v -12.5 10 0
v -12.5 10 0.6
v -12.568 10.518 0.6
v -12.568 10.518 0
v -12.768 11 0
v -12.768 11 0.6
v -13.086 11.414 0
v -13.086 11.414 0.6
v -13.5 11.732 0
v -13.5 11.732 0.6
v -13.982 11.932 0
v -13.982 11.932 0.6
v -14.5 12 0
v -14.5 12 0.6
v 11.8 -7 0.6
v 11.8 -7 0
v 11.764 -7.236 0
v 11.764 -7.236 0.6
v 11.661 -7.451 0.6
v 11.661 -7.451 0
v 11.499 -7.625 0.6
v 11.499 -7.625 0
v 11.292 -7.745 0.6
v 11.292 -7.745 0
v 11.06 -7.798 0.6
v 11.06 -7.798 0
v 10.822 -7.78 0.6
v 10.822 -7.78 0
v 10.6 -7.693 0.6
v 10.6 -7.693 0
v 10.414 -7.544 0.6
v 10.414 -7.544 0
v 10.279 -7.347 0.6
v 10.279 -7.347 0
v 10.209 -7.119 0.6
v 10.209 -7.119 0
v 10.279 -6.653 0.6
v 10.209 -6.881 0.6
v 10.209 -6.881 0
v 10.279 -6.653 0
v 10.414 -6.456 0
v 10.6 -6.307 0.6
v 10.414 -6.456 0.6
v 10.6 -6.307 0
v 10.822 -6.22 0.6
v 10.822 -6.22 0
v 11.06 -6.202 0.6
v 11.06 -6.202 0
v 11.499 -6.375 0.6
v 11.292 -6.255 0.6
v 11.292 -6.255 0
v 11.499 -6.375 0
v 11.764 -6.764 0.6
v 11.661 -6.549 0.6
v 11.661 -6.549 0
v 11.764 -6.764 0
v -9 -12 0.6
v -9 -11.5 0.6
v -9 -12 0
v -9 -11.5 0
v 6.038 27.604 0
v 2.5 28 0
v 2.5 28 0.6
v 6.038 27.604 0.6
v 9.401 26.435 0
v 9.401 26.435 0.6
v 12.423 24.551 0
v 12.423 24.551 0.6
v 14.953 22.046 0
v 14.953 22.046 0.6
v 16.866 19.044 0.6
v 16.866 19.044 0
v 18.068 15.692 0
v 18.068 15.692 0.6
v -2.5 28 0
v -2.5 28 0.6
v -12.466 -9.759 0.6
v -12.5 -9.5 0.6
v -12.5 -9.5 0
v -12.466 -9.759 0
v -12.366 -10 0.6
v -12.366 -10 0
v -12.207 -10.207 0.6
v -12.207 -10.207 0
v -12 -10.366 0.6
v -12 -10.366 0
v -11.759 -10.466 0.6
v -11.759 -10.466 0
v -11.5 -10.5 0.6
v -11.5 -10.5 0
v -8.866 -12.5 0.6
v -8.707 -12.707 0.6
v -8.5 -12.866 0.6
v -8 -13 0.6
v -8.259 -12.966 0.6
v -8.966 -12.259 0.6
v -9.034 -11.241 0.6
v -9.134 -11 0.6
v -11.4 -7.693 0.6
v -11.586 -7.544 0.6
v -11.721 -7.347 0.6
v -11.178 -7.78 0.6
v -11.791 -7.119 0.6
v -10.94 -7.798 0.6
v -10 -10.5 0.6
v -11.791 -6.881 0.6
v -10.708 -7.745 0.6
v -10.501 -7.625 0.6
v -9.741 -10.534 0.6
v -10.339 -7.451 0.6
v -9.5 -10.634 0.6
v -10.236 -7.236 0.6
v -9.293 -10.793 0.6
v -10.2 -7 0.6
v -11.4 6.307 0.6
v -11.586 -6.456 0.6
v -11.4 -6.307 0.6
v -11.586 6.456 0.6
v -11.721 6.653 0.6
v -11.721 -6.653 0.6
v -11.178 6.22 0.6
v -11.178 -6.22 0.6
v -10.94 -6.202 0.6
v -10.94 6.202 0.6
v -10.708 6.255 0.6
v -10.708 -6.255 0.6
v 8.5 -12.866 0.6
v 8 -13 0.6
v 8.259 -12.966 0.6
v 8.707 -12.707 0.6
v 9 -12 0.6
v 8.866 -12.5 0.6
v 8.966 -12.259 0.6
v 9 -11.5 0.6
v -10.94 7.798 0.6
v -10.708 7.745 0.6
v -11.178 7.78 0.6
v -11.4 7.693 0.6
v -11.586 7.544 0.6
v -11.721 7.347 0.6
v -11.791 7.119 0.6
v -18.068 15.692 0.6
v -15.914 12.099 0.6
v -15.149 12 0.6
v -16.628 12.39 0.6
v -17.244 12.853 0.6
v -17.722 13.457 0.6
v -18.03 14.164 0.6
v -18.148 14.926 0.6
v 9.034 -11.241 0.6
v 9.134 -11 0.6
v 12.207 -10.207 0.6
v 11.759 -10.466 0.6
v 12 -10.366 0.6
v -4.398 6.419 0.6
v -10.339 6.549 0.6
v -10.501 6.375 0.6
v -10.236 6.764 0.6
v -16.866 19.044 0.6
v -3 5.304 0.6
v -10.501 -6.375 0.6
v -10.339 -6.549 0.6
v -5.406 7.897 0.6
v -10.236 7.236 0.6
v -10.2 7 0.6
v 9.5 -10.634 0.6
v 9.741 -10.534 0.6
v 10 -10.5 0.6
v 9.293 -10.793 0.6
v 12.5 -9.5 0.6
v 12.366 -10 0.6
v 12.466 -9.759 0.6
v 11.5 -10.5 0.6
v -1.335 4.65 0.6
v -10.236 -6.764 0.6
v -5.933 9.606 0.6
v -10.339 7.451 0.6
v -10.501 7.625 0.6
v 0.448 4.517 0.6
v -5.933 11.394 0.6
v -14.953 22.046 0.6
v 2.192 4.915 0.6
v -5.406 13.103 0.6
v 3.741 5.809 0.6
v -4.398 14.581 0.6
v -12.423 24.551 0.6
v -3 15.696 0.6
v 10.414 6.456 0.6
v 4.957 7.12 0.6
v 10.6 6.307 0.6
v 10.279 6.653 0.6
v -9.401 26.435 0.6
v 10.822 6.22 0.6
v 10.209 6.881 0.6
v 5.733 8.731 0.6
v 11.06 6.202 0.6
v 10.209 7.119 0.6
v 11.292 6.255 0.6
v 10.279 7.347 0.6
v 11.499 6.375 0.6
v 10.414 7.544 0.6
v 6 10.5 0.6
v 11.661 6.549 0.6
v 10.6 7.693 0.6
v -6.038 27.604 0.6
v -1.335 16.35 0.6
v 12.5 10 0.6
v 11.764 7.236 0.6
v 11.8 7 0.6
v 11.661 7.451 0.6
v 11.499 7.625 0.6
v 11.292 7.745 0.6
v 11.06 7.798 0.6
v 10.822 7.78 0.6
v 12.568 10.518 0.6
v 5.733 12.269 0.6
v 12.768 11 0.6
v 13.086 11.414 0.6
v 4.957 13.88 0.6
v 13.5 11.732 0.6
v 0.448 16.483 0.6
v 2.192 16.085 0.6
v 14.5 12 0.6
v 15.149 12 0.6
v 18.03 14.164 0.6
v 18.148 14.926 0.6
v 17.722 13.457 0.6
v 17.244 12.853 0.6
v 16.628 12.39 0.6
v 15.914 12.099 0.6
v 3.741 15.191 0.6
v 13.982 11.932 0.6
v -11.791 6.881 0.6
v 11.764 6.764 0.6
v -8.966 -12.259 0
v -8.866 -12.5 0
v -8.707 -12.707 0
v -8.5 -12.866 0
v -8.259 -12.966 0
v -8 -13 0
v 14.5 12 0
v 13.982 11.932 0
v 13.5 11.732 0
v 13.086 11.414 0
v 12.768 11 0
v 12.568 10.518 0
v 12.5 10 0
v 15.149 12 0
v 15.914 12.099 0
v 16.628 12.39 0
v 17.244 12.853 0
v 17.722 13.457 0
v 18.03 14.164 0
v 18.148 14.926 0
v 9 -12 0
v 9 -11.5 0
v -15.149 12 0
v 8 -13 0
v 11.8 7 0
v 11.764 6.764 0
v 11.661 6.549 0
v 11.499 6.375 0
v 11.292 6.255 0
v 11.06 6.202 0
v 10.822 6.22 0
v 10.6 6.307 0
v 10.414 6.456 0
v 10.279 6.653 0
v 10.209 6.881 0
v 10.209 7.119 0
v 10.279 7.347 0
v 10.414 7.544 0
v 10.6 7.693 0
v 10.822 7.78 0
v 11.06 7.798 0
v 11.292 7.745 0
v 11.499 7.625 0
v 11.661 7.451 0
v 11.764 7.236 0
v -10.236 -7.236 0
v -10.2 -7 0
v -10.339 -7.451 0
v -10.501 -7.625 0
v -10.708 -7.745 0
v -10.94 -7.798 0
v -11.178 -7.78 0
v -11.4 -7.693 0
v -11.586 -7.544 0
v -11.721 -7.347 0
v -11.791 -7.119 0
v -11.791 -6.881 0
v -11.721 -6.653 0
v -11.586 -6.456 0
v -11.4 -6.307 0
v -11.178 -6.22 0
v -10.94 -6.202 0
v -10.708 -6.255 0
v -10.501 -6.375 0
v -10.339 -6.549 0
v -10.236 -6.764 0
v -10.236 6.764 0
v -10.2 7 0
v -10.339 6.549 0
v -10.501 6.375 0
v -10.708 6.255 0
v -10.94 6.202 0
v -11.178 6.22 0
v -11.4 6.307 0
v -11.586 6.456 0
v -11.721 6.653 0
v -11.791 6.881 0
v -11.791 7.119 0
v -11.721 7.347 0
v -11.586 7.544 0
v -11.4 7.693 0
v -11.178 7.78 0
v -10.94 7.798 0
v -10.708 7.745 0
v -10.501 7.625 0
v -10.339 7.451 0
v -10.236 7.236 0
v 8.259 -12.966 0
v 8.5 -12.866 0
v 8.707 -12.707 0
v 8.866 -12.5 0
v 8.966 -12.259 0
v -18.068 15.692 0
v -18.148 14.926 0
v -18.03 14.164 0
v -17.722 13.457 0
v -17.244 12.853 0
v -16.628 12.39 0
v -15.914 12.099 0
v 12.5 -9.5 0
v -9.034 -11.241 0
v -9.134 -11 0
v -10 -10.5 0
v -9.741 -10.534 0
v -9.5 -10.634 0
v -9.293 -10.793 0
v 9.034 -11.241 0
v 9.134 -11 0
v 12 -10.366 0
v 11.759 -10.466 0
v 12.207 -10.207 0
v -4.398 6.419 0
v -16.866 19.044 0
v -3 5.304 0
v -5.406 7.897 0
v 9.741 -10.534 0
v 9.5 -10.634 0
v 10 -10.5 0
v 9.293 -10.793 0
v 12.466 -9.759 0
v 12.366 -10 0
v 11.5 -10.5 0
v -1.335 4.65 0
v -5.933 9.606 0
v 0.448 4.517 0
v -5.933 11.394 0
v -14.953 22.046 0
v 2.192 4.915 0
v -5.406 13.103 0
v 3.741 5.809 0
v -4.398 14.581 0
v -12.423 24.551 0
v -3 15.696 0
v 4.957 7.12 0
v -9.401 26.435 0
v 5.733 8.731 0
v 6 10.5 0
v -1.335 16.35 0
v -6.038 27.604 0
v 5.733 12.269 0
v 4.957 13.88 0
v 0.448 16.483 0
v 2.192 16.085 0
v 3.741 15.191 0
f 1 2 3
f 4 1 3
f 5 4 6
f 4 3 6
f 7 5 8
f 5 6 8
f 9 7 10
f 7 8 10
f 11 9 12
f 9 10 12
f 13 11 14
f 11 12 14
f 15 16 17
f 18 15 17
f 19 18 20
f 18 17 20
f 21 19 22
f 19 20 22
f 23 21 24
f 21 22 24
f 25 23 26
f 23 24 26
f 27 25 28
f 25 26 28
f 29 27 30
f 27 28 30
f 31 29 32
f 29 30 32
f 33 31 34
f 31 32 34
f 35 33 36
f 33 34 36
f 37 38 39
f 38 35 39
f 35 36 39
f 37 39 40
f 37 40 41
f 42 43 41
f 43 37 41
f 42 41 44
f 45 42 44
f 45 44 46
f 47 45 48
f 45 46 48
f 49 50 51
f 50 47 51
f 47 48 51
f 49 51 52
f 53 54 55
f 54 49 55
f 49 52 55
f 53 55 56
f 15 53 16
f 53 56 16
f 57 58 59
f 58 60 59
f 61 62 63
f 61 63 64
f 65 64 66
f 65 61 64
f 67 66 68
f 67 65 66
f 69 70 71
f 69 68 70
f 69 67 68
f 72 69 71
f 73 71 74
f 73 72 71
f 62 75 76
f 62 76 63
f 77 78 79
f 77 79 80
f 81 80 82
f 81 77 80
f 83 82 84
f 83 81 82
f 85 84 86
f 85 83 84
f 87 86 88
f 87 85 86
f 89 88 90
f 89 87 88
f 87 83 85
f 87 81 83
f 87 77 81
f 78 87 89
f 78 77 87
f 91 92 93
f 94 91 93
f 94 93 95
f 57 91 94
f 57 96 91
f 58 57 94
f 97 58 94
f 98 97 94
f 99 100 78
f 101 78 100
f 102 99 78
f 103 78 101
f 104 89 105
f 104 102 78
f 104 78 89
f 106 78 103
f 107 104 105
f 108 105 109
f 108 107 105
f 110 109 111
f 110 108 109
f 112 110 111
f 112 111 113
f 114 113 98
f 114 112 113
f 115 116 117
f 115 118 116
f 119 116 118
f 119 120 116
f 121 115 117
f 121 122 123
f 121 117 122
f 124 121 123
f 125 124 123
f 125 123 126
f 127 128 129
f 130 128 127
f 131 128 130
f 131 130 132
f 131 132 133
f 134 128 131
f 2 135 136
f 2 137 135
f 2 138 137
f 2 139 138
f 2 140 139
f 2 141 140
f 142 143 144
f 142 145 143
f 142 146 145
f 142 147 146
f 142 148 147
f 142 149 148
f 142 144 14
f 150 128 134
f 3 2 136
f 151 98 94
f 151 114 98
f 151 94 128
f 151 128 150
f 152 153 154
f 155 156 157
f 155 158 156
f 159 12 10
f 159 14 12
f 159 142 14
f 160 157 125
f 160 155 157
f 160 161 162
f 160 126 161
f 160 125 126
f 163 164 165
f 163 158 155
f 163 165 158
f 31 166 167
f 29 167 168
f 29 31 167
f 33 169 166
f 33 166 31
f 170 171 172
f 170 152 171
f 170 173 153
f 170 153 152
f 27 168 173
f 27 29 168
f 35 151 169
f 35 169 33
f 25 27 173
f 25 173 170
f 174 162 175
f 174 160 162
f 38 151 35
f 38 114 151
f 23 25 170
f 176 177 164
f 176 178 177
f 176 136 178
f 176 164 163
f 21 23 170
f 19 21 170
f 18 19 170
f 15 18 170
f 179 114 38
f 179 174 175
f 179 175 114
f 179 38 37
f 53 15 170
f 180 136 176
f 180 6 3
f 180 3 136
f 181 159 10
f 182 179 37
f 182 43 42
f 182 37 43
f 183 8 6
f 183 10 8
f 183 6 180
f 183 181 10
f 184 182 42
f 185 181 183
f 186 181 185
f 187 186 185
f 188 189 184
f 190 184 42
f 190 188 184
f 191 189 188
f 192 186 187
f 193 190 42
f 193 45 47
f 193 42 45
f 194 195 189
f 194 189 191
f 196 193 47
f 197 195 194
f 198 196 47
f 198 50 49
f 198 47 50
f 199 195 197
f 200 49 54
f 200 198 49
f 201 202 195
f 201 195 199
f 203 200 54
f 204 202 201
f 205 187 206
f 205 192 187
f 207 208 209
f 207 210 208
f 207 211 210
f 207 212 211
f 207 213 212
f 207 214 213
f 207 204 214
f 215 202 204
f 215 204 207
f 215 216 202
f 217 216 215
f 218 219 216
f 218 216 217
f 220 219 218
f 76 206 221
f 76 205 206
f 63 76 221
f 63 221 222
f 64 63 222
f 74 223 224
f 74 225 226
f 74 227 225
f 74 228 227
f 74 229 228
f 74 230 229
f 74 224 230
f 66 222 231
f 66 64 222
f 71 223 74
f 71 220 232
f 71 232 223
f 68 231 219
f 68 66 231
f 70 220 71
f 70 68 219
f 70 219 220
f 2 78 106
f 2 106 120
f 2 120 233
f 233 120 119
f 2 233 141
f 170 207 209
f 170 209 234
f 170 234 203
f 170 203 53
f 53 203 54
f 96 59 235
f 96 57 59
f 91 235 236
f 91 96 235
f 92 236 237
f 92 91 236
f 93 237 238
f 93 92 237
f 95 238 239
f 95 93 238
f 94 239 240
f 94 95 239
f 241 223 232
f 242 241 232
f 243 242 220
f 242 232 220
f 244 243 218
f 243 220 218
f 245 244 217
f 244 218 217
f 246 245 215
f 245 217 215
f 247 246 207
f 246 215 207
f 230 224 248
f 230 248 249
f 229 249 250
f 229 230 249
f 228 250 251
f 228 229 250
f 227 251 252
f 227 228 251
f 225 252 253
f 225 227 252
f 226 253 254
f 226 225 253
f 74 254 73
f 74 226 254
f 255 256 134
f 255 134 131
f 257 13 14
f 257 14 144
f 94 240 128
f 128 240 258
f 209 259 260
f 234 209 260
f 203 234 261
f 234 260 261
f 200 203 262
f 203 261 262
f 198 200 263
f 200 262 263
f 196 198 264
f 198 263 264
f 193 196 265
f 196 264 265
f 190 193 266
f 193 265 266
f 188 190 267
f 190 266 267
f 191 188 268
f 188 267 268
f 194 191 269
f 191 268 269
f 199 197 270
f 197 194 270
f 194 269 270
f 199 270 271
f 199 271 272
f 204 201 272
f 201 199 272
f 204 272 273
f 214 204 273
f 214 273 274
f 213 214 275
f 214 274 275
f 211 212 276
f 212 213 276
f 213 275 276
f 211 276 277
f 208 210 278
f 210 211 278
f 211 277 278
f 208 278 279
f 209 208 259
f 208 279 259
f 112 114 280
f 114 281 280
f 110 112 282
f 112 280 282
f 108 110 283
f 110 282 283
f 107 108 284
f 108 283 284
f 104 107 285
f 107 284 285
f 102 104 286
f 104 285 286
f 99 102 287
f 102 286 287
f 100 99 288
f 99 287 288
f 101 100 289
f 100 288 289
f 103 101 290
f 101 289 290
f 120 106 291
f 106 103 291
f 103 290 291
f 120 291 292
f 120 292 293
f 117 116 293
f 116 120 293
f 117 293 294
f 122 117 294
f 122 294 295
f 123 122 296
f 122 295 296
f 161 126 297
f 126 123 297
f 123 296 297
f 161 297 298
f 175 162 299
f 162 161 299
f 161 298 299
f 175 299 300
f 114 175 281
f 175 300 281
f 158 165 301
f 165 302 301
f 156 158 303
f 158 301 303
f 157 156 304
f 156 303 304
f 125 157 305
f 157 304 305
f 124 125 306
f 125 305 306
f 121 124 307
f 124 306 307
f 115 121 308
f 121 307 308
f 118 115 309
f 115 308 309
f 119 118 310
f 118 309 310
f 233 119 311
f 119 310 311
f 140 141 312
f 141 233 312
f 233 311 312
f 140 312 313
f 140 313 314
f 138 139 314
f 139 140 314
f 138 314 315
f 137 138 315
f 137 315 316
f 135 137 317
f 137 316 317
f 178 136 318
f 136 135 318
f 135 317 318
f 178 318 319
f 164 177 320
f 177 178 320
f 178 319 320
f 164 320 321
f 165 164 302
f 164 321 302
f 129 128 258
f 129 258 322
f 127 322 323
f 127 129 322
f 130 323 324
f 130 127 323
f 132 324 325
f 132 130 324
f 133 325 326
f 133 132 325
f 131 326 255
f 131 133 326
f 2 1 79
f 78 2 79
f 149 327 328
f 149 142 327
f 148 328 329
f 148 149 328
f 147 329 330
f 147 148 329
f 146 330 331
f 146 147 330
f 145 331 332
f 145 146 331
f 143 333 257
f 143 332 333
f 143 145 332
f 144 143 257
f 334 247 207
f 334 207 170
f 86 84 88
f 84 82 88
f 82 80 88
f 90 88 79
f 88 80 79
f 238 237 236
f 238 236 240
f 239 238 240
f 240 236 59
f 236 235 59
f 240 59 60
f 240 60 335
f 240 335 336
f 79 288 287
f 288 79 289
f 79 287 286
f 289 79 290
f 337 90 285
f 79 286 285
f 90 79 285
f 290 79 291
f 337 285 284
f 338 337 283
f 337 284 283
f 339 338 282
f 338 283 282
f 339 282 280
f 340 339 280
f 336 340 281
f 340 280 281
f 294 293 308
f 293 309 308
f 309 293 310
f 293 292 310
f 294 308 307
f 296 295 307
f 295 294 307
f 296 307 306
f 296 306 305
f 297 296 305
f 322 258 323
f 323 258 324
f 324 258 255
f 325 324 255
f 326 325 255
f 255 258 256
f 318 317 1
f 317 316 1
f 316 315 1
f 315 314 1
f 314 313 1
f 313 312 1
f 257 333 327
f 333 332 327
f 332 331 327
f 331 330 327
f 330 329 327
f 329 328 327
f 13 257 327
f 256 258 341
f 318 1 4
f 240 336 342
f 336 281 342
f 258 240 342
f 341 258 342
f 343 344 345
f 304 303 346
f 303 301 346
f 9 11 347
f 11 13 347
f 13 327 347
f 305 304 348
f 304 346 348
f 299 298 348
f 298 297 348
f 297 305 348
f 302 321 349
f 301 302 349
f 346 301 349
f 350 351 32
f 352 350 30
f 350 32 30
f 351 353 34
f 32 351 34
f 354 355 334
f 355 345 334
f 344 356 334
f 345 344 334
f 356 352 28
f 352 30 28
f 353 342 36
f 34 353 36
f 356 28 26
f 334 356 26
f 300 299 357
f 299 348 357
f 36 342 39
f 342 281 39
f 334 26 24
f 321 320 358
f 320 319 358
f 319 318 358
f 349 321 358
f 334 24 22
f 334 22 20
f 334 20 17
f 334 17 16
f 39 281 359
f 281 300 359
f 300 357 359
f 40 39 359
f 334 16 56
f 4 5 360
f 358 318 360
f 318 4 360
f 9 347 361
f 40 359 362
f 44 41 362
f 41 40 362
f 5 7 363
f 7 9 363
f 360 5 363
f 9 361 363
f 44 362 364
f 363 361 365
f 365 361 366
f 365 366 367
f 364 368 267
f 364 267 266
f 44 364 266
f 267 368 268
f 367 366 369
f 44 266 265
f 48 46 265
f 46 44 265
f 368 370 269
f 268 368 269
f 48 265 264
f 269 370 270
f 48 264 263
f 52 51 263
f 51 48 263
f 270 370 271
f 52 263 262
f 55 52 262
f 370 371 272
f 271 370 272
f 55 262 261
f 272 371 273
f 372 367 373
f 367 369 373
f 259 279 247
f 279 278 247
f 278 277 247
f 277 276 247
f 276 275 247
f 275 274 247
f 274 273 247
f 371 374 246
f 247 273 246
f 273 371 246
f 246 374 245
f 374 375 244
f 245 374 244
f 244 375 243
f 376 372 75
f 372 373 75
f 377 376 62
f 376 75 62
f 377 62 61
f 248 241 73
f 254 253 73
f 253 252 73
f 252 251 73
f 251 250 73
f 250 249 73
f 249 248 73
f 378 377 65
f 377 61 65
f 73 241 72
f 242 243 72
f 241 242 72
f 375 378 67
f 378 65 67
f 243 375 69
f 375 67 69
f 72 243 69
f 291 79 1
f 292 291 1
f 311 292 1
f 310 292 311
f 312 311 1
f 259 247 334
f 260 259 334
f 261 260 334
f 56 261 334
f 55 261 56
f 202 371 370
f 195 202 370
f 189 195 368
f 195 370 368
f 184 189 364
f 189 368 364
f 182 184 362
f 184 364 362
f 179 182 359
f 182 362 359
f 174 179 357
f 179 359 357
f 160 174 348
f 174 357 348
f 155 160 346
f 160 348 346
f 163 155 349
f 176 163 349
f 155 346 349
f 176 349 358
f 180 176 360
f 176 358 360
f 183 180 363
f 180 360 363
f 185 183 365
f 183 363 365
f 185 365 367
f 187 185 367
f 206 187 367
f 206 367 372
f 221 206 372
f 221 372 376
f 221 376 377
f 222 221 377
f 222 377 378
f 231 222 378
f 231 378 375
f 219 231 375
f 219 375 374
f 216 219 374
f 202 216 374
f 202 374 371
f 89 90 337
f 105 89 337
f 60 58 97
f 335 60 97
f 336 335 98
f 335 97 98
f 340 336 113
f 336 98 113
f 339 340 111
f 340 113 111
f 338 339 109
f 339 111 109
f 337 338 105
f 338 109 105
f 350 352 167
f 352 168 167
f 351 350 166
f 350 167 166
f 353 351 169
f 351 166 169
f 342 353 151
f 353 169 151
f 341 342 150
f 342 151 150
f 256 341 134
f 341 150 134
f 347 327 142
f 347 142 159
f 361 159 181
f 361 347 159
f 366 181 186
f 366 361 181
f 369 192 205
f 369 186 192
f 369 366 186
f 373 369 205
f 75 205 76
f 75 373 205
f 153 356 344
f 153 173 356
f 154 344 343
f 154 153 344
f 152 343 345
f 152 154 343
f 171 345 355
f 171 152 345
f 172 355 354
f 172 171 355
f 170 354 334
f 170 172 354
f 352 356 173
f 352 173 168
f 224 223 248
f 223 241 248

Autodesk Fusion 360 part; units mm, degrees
sketch "スケッチ1" plane through (0, 0, 0) normal (0, 0, 1) x (1, 0, 0)
  line L0 (0, 0) -> (-12.5, 0)
  line L1 (-12.5, 0) -> (-12.5, 12)
  line L2 (-12.5, 12) -> (0, 12)
  line L3 (0, 12) -> (0, 0)
  line L4 (0, 0) -> (12.5, 0)
  line L5 (12.5, 0) -> (12.5, 12)
  line L6 (12.5, 12) -> (0, 12)
  line L7 (0, 12) -> (0, 0)
  line L8 (0, 0) -> (-12.5, 0)
  line L9 (-12.5, 0) -> (-12.5, -10.5)
  line L10 (-12.5, -10.5) -> (0, -10.5)
  line L11 (0, -10.5) -> (0, 0)
  line L12 (0, 0) -> (12.5, 0)
  line L13 (12.5, 0) -> (12.5, -10.5)
  line L14 (12.5, -10.5) -> (0, -10.5)
  line L15 (0, -10.5) -> (0, 0)
  line L16 (0, -10.5) -> (-9, -10.5)
  line L17 (-9, -10.5) -> (-9, -13)
  line L18 (-9, -13) -> (0, -13)
  line L19 (0, -13) -> (0, -10.5)
  line L20 (0, -10.5) -> (9, -10.5)
  line L21 (9, -10.5) -> (9, -13)
  line L22 (9, -13) -> (0, -13)
  line L23 (0, -13) -> (0, -10.5)
  line L24 (-12.5, 12) -> (-18.5, 12)
  line L25 (12.5, 12) -> (18.5, 12)
  arc A0 (-2.5, 28) -> (-18.5, 12) centre (-2.5, 12) ccw
  arc A1 (18.5, 12) -> (2.5, 28) centre (2.5, 12) ccw
  line L26 (-2.5, 28) -> (2.5, 28)
  circle A2 centre (-11, 7) radius 0.8
  circle A3 centre (-11, -7) radius 0.8
  circle A4 centre (11, -7) radius 0.8
  circle A5 centre (11, 7) radius 0.8
  circle A6 centre (0, 10.5) radius 6
  line L27 (0, 12) -> (0, 28)
  dimension "d1" = 6
  dimension "d2" = 12.5
  dimension "d3" = 12
  dimension "d4" = 28
  dimension "d5" = 1.6
  dimension "d6" = 7
  dimension "d7" = 3.5
  dimension "d8" = 3.5
  dimension "d9" = 2.5
  dimension "d10" = 12
  dimension "d11" = 10.5
  dimension "d17" = 22
extrude "押し出し1" add sketch "スケッチ1" along normal blind 0.6 contours L0 L8 L9 L10 L11 L15 L16 | L0 L1 L2 L3 L7 L8 A6 | L3 L4 L5 L6 L7 L12 A6 | L4 L11 L12 L13 L14 L15 L20 | L10 L16 L17 L18 L19 L23 | L14 L19 L20 L21 L22 L23 | L2 L24 A0 L26 A6 L27 | L6 L25 A1 L26 A6 L27
fillet "フィレット1" radius 3 2 edges at (-18.5, 12, 0.3) (18.5, 12, 0.3)
fillet "フィレット1" radius 2 2 edges at (-12.5, 12, 0.3) (12.5, 12, 0.3)
fillet "フィレット1" radius 1 6 edges at (-12.5, -10.5, 0.3) (-9, -10.5, 0.3) (-9, -13, 0.3) (9, -13, 0.3) (9, -10.5, 0.3) (12.5, -10.5, 0.3)
